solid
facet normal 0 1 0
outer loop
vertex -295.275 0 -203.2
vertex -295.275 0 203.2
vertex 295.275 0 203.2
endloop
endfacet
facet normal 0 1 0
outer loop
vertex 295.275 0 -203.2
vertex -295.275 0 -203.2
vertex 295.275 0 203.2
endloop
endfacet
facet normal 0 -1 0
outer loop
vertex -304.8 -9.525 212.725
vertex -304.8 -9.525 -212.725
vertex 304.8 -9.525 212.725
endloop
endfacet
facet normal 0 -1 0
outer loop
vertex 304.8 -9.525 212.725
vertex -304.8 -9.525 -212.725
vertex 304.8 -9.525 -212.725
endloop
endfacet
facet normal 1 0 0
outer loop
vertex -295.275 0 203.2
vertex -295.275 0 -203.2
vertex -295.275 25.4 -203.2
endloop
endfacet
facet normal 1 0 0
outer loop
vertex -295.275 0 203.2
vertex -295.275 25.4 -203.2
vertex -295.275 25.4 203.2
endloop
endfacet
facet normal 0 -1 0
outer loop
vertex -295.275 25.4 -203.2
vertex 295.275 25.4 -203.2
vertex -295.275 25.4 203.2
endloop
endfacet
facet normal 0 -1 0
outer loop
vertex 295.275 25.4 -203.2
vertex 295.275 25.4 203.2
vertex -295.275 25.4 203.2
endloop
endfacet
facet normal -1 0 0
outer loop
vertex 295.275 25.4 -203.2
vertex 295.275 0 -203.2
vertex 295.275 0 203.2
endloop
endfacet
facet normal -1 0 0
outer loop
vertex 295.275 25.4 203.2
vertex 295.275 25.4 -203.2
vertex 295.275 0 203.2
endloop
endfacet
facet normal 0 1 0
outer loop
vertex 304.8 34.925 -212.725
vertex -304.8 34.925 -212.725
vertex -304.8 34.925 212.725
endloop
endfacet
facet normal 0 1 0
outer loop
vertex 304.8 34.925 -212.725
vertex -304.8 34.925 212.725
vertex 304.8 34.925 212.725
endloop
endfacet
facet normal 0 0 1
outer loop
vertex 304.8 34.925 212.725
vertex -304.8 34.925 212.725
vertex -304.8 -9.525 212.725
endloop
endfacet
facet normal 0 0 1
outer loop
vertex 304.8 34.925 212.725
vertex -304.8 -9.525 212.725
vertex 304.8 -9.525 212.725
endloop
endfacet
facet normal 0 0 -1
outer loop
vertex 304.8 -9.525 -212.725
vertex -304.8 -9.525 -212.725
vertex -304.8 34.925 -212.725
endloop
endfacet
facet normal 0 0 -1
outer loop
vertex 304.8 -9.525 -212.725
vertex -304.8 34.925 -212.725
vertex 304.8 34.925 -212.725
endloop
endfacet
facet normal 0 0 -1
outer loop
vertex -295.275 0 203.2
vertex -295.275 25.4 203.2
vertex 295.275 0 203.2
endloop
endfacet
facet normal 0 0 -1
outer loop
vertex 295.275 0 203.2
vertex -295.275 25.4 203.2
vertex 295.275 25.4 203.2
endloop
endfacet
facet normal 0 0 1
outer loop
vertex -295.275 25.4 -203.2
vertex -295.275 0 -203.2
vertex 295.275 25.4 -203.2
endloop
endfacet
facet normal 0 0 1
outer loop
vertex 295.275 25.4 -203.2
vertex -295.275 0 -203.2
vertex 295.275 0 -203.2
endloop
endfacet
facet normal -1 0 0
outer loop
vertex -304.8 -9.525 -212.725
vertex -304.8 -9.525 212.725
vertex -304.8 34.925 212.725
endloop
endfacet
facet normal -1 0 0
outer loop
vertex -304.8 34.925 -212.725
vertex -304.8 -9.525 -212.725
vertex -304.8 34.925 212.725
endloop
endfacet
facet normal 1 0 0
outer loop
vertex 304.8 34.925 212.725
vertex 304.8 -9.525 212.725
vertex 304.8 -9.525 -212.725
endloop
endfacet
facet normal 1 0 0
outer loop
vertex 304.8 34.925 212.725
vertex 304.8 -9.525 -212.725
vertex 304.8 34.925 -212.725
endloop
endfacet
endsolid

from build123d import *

# Parameters (mm, degrees)
F0_W     = 609.6
F0_H     = 406.4
F1_DEPTH = 9.525
F2_W     = 9.525
F2_H     = 406.4
F3_DEPTH = 25.4
F4_W     = 600.075
F4_H     = 406.4
F4_W_2   = 9.525
F5_DEPTH = 9.525
F6_W     = 609.6
F6_H     = 44.45
F7_DEPTH = 9.525
F8_W     = 609.6
F8_H     = 44.45
F9_DEPTH = 9.525


# Not quite as in the source:
# - a length typed as a fraction of an inch, garbled in the dataset ("3 / 203.2 mm" for 3/8 in), is restored


with BuildPart() as f1:
    # F0 (on Front) → F1 (new body)
    with BuildSketch(Plane.XZ):
        Rectangle(F0_W, F0_H)
    extrude(amount=F1_DEPTH)

    # F2 (on face) → F3 (join)
    with BuildSketch(Plane(origin=(0, 0, 0), x_dir=(-1, 0, 0), z_dir=(0, 1, 0))):
        with Locations((-300.0375, 0)):
            Rectangle(F2_W, F2_H)
        with Locations((300.0375, 0)):
            Rectangle(F2_W, F2_H)
    extrude(amount=F3_DEPTH)

    # F4 (on face) → F5 (join)
    with BuildSketch(Plane(origin=(0, 25.4, 0), x_dir=(-1, 0, 0), z_dir=(0, 1, 0))):
        with Locations((4.7625, 0)):
            Rectangle(F4_W, F4_H)
        with Locations((-300.0375, 0)):
            Rectangle(F4_W_2, F4_H)
    extrude(amount=F5_DEPTH)

    # F6 (on face) → F7 (join)
    with BuildSketch(Plane(origin=(0, 0, -203.2), x_dir=(1, 0, 0), z_dir=(0, 0, -1))):
        with Locations((0, -12.7)):
            Rectangle(F6_W, F6_H)
    extrude(amount=F7_DEPTH)

    # F8 (on face) → F9 (join)
    with BuildSketch(Plane.XY.offset(203.2)):
        with Locations((0, 12.7)):
            Rectangle(F8_W, F8_H)
    extrude(amount=F9_DEPTH)


solid = f1.part
